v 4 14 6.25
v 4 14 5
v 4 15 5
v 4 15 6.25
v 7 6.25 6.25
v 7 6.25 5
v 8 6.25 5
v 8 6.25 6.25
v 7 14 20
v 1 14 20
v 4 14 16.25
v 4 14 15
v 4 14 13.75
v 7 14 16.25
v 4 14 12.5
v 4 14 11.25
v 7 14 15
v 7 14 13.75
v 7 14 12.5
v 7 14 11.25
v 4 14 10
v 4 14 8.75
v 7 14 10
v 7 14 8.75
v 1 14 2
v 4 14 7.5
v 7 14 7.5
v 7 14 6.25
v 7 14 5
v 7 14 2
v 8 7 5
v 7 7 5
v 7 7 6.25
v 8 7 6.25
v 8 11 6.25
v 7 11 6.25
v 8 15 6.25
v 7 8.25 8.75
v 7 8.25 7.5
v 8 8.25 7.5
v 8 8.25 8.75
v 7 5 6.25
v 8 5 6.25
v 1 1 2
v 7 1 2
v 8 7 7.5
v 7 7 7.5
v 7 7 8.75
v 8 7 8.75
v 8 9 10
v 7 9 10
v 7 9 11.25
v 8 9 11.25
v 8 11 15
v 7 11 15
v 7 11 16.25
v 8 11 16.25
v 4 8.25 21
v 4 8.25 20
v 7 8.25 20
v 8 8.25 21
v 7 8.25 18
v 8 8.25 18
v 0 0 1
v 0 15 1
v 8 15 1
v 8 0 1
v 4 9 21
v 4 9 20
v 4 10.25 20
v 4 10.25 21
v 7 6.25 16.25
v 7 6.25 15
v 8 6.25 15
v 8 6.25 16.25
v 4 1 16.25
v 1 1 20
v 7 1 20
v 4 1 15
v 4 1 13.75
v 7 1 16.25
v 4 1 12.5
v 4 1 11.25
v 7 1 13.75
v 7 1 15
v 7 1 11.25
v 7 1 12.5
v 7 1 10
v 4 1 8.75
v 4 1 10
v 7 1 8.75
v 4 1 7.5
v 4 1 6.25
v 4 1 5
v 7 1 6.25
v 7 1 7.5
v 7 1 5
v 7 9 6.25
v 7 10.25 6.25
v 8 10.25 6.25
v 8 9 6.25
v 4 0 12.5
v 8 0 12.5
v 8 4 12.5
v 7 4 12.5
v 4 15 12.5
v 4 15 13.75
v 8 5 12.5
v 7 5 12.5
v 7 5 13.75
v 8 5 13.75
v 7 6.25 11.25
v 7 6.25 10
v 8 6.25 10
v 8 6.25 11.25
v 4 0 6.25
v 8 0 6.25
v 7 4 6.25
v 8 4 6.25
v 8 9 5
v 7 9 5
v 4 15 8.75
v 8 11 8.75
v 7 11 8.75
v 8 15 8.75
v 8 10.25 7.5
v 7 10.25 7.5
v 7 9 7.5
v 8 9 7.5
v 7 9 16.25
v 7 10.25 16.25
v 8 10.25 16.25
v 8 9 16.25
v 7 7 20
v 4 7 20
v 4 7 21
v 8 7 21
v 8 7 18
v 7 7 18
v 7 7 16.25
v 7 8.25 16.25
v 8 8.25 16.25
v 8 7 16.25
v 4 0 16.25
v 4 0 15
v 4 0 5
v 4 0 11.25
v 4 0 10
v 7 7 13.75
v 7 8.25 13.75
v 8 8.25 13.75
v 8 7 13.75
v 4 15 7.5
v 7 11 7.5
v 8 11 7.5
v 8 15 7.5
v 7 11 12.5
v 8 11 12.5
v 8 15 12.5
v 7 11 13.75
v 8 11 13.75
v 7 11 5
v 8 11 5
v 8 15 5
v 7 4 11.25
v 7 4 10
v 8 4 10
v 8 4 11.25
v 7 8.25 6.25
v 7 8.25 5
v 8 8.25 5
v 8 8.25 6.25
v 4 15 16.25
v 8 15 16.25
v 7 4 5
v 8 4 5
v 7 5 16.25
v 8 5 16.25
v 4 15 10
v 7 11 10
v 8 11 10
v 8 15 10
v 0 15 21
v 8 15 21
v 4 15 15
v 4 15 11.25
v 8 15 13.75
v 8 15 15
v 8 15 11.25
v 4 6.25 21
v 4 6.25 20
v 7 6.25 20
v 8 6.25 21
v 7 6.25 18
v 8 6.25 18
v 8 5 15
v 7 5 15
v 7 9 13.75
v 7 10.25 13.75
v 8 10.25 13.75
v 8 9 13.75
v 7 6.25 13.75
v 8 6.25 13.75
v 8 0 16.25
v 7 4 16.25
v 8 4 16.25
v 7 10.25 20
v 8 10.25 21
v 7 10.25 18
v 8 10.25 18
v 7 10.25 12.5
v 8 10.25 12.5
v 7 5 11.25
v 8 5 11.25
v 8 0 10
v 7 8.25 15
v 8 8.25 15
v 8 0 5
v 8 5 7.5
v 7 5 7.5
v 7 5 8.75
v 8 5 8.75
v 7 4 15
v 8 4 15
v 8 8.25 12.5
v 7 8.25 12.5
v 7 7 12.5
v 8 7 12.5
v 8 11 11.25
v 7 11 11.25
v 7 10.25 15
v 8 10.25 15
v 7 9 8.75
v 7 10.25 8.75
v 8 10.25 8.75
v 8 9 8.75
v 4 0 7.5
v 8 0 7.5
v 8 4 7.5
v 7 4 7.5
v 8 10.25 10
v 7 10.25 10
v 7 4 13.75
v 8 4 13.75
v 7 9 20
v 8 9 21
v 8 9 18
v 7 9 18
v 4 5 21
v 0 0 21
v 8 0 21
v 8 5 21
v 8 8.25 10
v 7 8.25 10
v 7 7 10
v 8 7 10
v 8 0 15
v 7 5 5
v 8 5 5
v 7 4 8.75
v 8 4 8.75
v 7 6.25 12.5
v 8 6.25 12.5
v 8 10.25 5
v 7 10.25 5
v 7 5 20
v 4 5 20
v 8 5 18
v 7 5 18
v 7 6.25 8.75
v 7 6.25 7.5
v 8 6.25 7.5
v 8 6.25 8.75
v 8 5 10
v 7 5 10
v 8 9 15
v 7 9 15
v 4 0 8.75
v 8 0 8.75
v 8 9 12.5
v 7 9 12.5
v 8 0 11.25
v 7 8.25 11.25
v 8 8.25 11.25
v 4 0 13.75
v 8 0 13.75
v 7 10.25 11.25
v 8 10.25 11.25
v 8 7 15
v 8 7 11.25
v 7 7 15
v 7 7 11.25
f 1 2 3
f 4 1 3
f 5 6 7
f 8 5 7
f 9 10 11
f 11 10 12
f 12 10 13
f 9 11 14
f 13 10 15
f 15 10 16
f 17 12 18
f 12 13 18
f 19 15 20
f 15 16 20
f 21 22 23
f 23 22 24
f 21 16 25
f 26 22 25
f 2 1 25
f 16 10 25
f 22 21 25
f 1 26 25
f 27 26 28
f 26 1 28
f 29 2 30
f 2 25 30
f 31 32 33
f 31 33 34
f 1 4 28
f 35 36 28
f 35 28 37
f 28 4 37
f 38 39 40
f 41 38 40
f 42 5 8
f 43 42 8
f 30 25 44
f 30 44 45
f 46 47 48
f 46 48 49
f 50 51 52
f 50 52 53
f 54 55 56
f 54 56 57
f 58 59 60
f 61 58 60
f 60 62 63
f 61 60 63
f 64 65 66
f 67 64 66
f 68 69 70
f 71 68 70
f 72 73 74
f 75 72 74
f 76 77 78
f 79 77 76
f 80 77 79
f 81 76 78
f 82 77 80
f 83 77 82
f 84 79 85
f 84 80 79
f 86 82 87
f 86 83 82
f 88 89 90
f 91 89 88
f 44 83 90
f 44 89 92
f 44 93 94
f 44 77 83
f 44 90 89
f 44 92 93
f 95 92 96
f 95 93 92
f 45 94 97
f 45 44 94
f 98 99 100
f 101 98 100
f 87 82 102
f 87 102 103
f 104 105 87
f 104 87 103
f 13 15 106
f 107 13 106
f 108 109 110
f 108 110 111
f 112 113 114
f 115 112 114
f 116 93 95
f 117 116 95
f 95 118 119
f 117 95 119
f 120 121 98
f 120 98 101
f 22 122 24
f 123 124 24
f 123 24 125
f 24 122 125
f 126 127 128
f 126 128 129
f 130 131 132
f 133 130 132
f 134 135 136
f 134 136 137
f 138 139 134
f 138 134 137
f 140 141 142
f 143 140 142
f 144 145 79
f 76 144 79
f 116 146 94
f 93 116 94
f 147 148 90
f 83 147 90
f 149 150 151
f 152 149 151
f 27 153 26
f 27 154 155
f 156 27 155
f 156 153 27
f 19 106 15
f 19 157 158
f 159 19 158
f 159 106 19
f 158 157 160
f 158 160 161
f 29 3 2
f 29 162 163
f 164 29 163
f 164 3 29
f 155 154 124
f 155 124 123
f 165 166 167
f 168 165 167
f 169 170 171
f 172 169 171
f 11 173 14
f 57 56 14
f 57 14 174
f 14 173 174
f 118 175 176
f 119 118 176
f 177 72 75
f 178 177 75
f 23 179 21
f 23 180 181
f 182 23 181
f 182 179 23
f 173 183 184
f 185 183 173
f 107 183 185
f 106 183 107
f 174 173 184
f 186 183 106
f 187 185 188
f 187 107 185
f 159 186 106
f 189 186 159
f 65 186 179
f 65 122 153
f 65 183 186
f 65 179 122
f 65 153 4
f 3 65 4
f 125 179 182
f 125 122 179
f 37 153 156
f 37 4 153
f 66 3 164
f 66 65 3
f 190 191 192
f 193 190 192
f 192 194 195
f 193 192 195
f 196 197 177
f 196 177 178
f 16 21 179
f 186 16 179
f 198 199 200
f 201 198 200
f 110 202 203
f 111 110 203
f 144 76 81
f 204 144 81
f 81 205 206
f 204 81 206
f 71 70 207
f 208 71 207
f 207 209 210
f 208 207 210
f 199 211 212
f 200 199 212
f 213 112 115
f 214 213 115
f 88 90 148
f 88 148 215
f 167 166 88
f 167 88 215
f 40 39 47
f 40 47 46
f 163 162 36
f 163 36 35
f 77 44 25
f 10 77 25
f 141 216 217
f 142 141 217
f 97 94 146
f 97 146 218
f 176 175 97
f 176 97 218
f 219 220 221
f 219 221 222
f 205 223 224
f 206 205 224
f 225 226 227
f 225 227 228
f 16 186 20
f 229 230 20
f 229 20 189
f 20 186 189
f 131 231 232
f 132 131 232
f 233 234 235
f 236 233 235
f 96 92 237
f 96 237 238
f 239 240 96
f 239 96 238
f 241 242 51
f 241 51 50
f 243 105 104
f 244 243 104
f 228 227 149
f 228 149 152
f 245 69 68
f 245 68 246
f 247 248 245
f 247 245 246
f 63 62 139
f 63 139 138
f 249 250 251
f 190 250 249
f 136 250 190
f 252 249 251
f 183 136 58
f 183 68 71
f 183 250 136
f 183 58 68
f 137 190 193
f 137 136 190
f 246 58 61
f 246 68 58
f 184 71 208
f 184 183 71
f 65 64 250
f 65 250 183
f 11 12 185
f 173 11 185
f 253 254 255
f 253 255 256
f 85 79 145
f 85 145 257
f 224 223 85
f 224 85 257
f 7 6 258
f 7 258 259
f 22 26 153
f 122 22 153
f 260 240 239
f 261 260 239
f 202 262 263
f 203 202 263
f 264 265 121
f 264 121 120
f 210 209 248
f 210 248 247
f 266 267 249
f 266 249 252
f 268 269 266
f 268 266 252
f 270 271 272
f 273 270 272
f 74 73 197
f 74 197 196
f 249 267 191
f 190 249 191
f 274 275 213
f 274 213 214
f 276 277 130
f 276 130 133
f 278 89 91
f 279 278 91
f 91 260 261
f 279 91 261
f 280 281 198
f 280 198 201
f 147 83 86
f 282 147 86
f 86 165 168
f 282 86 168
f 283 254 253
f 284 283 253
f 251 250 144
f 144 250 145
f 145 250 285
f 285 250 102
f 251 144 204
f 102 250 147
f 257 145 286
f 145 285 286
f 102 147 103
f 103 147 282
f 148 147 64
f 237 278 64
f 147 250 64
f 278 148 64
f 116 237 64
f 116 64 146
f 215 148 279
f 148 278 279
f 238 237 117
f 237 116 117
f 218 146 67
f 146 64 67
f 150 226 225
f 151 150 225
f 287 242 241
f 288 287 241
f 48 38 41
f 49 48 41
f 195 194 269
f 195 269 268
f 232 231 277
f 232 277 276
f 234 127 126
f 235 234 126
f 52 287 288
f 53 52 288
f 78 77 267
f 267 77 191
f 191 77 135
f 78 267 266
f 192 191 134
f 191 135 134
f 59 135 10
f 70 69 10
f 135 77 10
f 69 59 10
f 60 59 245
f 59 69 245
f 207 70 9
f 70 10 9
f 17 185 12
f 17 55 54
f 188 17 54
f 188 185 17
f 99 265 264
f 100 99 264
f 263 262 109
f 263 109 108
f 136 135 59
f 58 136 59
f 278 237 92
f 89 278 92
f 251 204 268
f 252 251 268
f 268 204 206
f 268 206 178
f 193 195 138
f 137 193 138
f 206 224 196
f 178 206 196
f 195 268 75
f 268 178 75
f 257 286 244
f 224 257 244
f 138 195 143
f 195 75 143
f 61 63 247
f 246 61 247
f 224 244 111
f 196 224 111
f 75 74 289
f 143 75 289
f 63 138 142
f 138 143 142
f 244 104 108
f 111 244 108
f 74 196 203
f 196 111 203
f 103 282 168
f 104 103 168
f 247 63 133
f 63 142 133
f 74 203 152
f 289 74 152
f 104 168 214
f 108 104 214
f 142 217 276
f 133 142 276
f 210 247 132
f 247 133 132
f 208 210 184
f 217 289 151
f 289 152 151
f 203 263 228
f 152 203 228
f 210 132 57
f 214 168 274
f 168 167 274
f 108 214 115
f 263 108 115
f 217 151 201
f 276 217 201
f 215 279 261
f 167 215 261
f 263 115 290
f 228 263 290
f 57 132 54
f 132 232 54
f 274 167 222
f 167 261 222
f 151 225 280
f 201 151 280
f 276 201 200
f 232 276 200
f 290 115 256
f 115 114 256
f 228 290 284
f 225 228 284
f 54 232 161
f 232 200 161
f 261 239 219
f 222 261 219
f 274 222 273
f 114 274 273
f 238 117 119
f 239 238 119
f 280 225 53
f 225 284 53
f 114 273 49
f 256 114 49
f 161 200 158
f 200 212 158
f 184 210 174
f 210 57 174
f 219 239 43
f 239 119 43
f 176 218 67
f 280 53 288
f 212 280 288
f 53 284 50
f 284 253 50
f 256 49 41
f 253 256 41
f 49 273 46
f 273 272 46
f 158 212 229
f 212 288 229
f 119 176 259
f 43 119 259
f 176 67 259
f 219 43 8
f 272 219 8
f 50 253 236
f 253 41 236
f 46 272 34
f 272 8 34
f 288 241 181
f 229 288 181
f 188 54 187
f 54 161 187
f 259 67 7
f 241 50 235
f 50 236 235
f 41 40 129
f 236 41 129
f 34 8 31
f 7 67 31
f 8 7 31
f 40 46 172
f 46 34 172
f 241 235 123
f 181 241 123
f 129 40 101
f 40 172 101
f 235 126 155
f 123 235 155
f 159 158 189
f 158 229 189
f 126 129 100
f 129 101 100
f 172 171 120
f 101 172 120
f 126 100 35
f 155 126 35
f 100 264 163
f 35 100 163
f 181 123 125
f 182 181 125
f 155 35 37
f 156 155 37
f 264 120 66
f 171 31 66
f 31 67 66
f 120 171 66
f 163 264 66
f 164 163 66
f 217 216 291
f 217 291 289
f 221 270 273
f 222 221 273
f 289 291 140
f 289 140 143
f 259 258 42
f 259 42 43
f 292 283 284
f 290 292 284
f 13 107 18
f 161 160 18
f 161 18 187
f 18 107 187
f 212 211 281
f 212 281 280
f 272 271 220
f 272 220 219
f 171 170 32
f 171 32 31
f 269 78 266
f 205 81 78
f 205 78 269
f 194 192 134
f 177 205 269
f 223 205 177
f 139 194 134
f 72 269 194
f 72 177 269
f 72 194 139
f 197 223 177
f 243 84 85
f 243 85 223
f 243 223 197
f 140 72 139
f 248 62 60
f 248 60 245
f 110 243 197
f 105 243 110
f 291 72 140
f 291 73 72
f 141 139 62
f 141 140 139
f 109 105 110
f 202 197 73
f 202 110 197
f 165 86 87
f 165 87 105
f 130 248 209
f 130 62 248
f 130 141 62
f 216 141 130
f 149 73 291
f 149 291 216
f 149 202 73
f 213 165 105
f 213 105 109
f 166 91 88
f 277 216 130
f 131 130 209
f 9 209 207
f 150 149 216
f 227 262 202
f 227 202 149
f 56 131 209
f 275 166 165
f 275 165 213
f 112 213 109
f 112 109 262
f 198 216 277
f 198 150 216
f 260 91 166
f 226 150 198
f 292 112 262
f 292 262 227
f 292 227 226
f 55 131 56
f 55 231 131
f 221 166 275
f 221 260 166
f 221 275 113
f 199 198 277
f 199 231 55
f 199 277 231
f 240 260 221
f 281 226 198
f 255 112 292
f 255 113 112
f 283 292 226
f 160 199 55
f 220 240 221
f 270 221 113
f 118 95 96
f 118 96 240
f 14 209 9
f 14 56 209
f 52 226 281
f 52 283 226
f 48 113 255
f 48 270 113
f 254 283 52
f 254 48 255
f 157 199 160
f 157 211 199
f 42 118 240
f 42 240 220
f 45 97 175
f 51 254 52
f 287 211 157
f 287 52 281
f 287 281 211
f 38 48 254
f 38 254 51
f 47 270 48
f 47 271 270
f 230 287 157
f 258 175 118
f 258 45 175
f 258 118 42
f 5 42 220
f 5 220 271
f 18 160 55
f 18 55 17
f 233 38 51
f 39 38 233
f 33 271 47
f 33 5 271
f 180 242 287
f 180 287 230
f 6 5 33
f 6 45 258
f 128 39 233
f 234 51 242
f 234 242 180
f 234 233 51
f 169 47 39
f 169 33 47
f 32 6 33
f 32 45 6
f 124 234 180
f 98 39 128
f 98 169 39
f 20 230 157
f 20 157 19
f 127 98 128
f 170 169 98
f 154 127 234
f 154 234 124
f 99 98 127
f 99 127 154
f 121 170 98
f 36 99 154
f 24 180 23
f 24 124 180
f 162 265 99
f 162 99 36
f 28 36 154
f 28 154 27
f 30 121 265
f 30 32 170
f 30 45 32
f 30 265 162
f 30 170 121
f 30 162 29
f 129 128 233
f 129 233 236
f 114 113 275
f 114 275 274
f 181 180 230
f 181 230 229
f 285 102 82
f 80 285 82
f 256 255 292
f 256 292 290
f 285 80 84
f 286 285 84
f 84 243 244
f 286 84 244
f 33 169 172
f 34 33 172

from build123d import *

# Parameters (mm, degrees)
BOX029_W     = 6
BOX029_H     = 13
BOX029_DEPTH = 18
BOX027_W     = 4
BOX027_H     = 1.25
BOX027_DEPTH = 3
BOX026_W     = 4
BOX026_H     = 1.25
BOX026_DEPTH = 3
BOX028_W     = 4
BOX028_H     = 1.25
BOX028_DEPTH = 3
BOX025_W     = 4
BOX025_H     = 4
BOX025_DEPTH = 1.25
BOX024_W     = 4
BOX024_H     = 4
BOX024_DEPTH = 1.25
BOX023_W     = 4
BOX023_H     = 4
BOX023_DEPTH = 1.25
BOX022_W     = 4
BOX022_H     = 4
BOX022_DEPTH = 1.25
BOX021_W     = 4
BOX021_H     = 4
BOX021_DEPTH = 1.25
BOX020_W     = 4
BOX020_H     = 4
BOX020_DEPTH = 1.25
BOX019_W     = 4
BOX019_H     = 4
BOX019_DEPTH = 1.25
BOX018_W     = 4
BOX018_H     = 4
BOX018_DEPTH = 1.25
BOX017_W     = 4
BOX017_H     = 4
BOX017_DEPTH = 1.25
BOX016_W     = 4
BOX016_H     = 4
BOX016_DEPTH = 1.25
BOX015_W     = 7
BOX015_H     = 1.25
BOX015_DEPTH = 1.25
BOX014_W     = 7
BOX014_H     = 1.25
BOX014_DEPTH = 1.25
BOX013_W     = 7
BOX013_H     = 1.25
BOX013_DEPTH = 1.25
BOX012_W     = 7
BOX012_H     = 1.25
BOX012_DEPTH = 1.25
BOX011_W     = 7
BOX011_H     = 1.25
BOX011_DEPTH = 1.25
BOX010_W     = 7
BOX010_H     = 1.25
BOX010_DEPTH = 1.25
BOX009_W     = 7
BOX009_H     = 1.25
BOX009_DEPTH = 1.25
BOX008_W     = 7
BOX008_H     = 1.25
BOX008_DEPTH = 1.25
BOX007_W     = 7
BOX007_H     = 1.25
BOX007_DEPTH = 1.25
BOX006_W     = 7
BOX006_H     = 1.25
BOX006_DEPTH = 1.25
BOX005_W     = 7
BOX005_H     = 1.25
BOX005_DEPTH = 1.25
BOX004_W     = 7
BOX004_H     = 1.25
BOX004_DEPTH = 1.25
BOX003_W     = 7
BOX003_H     = 1.25
BOX003_DEPTH = 1.25
BOX002_W     = 7
BOX002_H     = 1.25
BOX002_DEPTH = 1.25
BOX001_W     = 7
BOX001_H     = 1.25
BOX001_DEPTH = 1.25
BOX_W        = 8
BOX_H        = 15
BOX_DEPTH    = 20


with BuildPart() as middle:
    # Box029 → Box029 (new body)
    with BuildSketch(Plane(origin=(1, 1, 2), x_dir=(1, 0, 0), z_dir=(0, 0, 1))):
        with Locations((3, 6.5)):
            Rectangle(BOX029_W, BOX029_H)
    extrude(amount=BOX029_DEPTH)


with BuildPart() as cube027:
    # Box027 → Box027 (new body)
    with BuildSketch(Plane(origin=(4, 7, 18), x_dir=(1, 0, 0), z_dir=(0, 0, 1))):
        with Locations((2, 0.625)):
            Rectangle(BOX027_W, BOX027_H)
    extrude(amount=BOX027_DEPTH)


with BuildPart() as cube026:
    # Box026 → Box026 (new body)
    with BuildSketch(Plane(origin=(4, 9, 18), x_dir=(1, 0, 0), z_dir=(0, 0, 1))):
        with Locations((2, 0.625)):
            Rectangle(BOX026_W, BOX026_H)
    extrude(amount=BOX026_DEPTH)


with BuildPart() as cube028:
    # Box028 → Box028 (new body)
    with BuildSketch(Plane(origin=(4, 5, 18), x_dir=(1, 0, 0), z_dir=(0, 0, 1))):
        with Locations((2, 0.625)):
            Rectangle(BOX028_W, BOX028_H)
    extrude(amount=BOX028_DEPTH)


with BuildPart() as cube025:
    # Box025 → Box025 (new body)
    with BuildSketch(Plane(origin=(4, 11, 5), x_dir=(1, 0, 0), z_dir=(0, 0, 1))):
        with Locations((2, 2)):
            Rectangle(BOX025_W, BOX025_H)
    extrude(amount=BOX025_DEPTH)


with BuildPart() as cube024:
    # Box024 → Box024 (new body)
    with BuildSketch(Plane(origin=(4, 11, 7.5), x_dir=(1, 0, 0), z_dir=(0, 0, 1))):
        with Locations((2, 2)):
            Rectangle(BOX024_W, BOX024_H)
    extrude(amount=BOX024_DEPTH)


with BuildPart() as cube023:
    # Box023 → Box023 (new body)
    with BuildSketch(Plane(origin=(4, 11, 10), x_dir=(1, 0, 0), z_dir=(0, 0, 1))):
        with Locations((2, 2)):
            Rectangle(BOX023_W, BOX023_H)
    extrude(amount=BOX023_DEPTH)


with BuildPart() as cube022:
    # Box022 → Box022 (new body)
    with BuildSketch(Plane(origin=(4, 11, 12.5), x_dir=(1, 0, 0), z_dir=(0, 0, 1))):
        with Locations((2, 2)):
            Rectangle(BOX022_W, BOX022_H)
    extrude(amount=BOX022_DEPTH)


with BuildPart() as cube021:
    # Box021 → Box021 (new body)
    with BuildSketch(Plane(origin=(4, 11, 15), x_dir=(1, 0, 0), z_dir=(0, 0, 1))):
        with Locations((2, 2)):
            Rectangle(BOX021_W, BOX021_H)
    extrude(amount=BOX021_DEPTH)


with BuildPart() as cube020:
    # Box020 → Box020 (new body)
    with BuildSketch(Plane(origin=(4, 0, 15), x_dir=(1, 0, 0), z_dir=(0, 0, 1))):
        with Locations((2, 2)):
            Rectangle(BOX020_W, BOX020_H)
    extrude(amount=BOX020_DEPTH)


with BuildPart() as cube019:
    # Box019 → Box019 (new body)
    with BuildSketch(Plane(origin=(4, 0, 12.5), x_dir=(1, 0, 0), z_dir=(0, 0, 1))):
        with Locations((2, 2)):
            Rectangle(BOX019_W, BOX019_H)
    extrude(amount=BOX019_DEPTH)


with BuildPart() as cube018:
    # Box018 → Box018 (new body)
    with BuildSketch(Plane(origin=(4, 0, 10), x_dir=(1, 0, 0), z_dir=(0, 0, 1))):
        with Locations((2, 2)):
            Rectangle(BOX018_W, BOX018_H)
    extrude(amount=BOX018_DEPTH)


with BuildPart() as cube017:
    # Box017 → Box017 (new body)
    with BuildSketch(Plane(origin=(4, 0, 7.5), x_dir=(1, 0, 0), z_dir=(0, 0, 1))):
        with Locations((2, 2)):
            Rectangle(BOX017_W, BOX017_H)
    extrude(amount=BOX017_DEPTH)


with BuildPart() as cube016:
    # Box016 → Box016 (new body)
    with BuildSketch(Plane(origin=(4, 0, 5), x_dir=(1, 0, 0), z_dir=(0, 0, 1))):
        with Locations((2, 2)):
            Rectangle(BOX016_W, BOX016_H)
    extrude(amount=BOX016_DEPTH)


with BuildPart() as cube015:
    # Box015 → Box015 (new body)
    with BuildSketch(Plane(origin=(1, 9, 5), x_dir=(1, 0, 0), z_dir=(0, 0, 1))):
        with Locations((3.5, 0.625)):
            Rectangle(BOX015_W, BOX015_H)
    extrude(amount=BOX015_DEPTH)


with BuildPart() as cube014:
    # Box014 → Box014 (new body)
    with BuildSketch(Plane(origin=(1, 7, 5), x_dir=(1, 0, 0), z_dir=(0, 0, 1))):
        with Locations((3.5, 0.625)):
            Rectangle(BOX014_W, BOX014_H)
    extrude(amount=BOX014_DEPTH)


with BuildPart() as cube013:
    # Box013 → Box013 (new body)
    with BuildSketch(Plane(origin=(1, 5, 5), x_dir=(1, 0, 0), z_dir=(0, 0, 1))):
        with Locations((3.5, 0.625)):
            Rectangle(BOX013_W, BOX013_H)
    extrude(amount=BOX013_DEPTH)


with BuildPart() as cube012:
    # Box012 → Box012 (new body)
    with BuildSketch(Plane(origin=(1, 5, 7.5), x_dir=(1, 0, 0), z_dir=(0, 0, 1))):
        with Locations((3.5, 0.625)):
            Rectangle(BOX012_W, BOX012_H)
    extrude(amount=BOX012_DEPTH)


with BuildPart() as cube011:
    # Box011 → Box011 (new body)
    with BuildSketch(Plane(origin=(1, 7, 7.5), x_dir=(1, 0, 0), z_dir=(0, 0, 1))):
        with Locations((3.5, 0.625)):
            Rectangle(BOX011_W, BOX011_H)
    extrude(amount=BOX011_DEPTH)


with BuildPart() as cube010:
    # Box010 → Box010 (new body)
    with BuildSketch(Plane(origin=(1, 7, 10), x_dir=(1, 0, 0), z_dir=(0, 0, 1))):
        with Locations((3.5, 0.625)):
            Rectangle(BOX010_W, BOX010_H)
    extrude(amount=BOX010_DEPTH)


with BuildPart() as cube009:
    # Box009 → Box009 (new body)
    with BuildSketch(Plane(origin=(1, 9, 7.5), x_dir=(1, 0, 0), z_dir=(0, 0, 1))):
        with Locations((3.5, 0.625)):
            Rectangle(BOX009_W, BOX009_H)
    extrude(amount=BOX009_DEPTH)


with BuildPart() as cube008:
    # Box008 → Box008 (new body)
    with BuildSketch(Plane(origin=(1, 9, 10), x_dir=(1, 0, 0), z_dir=(0, 0, 1))):
        with Locations((3.5, 0.625)):
            Rectangle(BOX008_W, BOX008_H)
    extrude(amount=BOX008_DEPTH)


with BuildPart() as cube007:
    # Box007 → Box007 (new body)
    with BuildSketch(Plane(origin=(1, 5, 10), x_dir=(1, 0, 0), z_dir=(0, 0, 1))):
        with Locations((3.5, 0.625)):
            Rectangle(BOX007_W, BOX007_H)
    extrude(amount=BOX007_DEPTH)


with BuildPart() as cube006:
    # Box006 → Box006 (new body)
    with BuildSketch(Plane(origin=(1, 5, 12.5), x_dir=(1, 0, 0), z_dir=(0, 0, 1))):
        with Locations((3.5, 0.625)):
            Rectangle(BOX006_W, BOX006_H)
    extrude(amount=BOX006_DEPTH)


with BuildPart() as cube005:
    # Box005 → Box005 (new body)
    with BuildSketch(Plane(origin=(1, 9, 12.5), x_dir=(1, 0, 0), z_dir=(0, 0, 1))):
        with Locations((3.5, 0.625)):
            Rectangle(BOX005_W, BOX005_H)
    extrude(amount=BOX005_DEPTH)


with BuildPart() as cube004:
    # Box004 → Box004 (new body)
    with BuildSketch(Plane(origin=(1, 7, 12.5), x_dir=(1, 0, 0), z_dir=(0, 0, 1))):
        with Locations((3.5, 0.625)):
            Rectangle(BOX004_W, BOX004_H)
    extrude(amount=BOX004_DEPTH)


with BuildPart() as cube003:
    # Box003 → Box003 (new body)
    with BuildSketch(Plane(origin=(1, 9, 15), x_dir=(1, 0, 0), z_dir=(0, 0, 1))):
        with Locations((3.5, 0.625)):
            Rectangle(BOX003_W, BOX003_H)
    extrude(amount=BOX003_DEPTH)


with BuildPart() as cube002:
    # Box002 → Box002 (new body)
    with BuildSketch(Plane(origin=(1, 7, 15), x_dir=(1, 0, 0), z_dir=(0, 0, 1))):
        with Locations((3.5, 0.625)):
            Rectangle(BOX002_W, BOX002_H)
    extrude(amount=BOX002_DEPTH)


with BuildPart() as cube001:
    # Box001 → Box001 (new body)
    with BuildSketch(Plane(origin=(1, 5, 15), x_dir=(1, 0, 0), z_dir=(0, 0, 1))):
        with Locations((3.5, 0.625)):
            Rectangle(BOX001_W, BOX001_H)
    extrude(amount=BOX001_DEPTH)


with BuildPart() as cut045:
    # Box → Box (new body)
    with BuildSketch(Plane.XY.offset(1)):
        with Locations((4, 7.5)):
            Rectangle(BOX_W, BOX_H)
    extrude(amount=BOX_DEPTH)

    # Cut: cut Cube001
    add(cube001.part, mode=Mode.SUBTRACT)

    # Cut001: cut Cube002
    add(cube002.part, mode=Mode.SUBTRACT)

    # Cut002: cut Cube003
    add(cube003.part, mode=Mode.SUBTRACT)

    # Cut003: cut Cube004
    add(cube004.part, mode=Mode.SUBTRACT)

    # Cut004: cut Cube005
    add(cube005.part, mode=Mode.SUBTRACT)

    # Cut005: cut Cube006
    add(cube006.part, mode=Mode.SUBTRACT)

    # Cut006: cut Cube007
    add(cube007.part, mode=Mode.SUBTRACT)

    # Cut007: cut Cube008
    add(cube008.part, mode=Mode.SUBTRACT)

    # Cut008: cut Cube009
    add(cube009.part, mode=Mode.SUBTRACT)

    # Cut009: cut Cube010
    add(cube010.part, mode=Mode.SUBTRACT)

    # Cut010: cut Cube011
    add(cube011.part, mode=Mode.SUBTRACT)

    # Cut011: cut Cube012
    add(cube012.part, mode=Mode.SUBTRACT)

    # Cut012: cut Cube013
    add(cube013.part, mode=Mode.SUBTRACT)

    # Cut013: cut Cube014
    add(cube014.part, mode=Mode.SUBTRACT)

    # Cut014: cut Cube015
    add(cube015.part, mode=Mode.SUBTRACT)

    # Cut032: cut Cube016
    add(cube016.part, mode=Mode.SUBTRACT)

    # Cut033: cut Cube017
    add(cube017.part, mode=Mode.SUBTRACT)

    # Cut034: cut Cube018
    add(cube018.part, mode=Mode.SUBTRACT)

    # Cut035: cut Cube019
    add(cube019.part, mode=Mode.SUBTRACT)

    # Cut036: cut Cube020
    add(cube020.part, mode=Mode.SUBTRACT)

    # Cut037: cut Cube021
    add(cube021.part, mode=Mode.SUBTRACT)

    # Cut038: cut Cube022
    add(cube022.part, mode=Mode.SUBTRACT)

    # Cut039: cut Cube023
    add(cube023.part, mode=Mode.SUBTRACT)

    # Cut040: cut Cube024
    add(cube024.part, mode=Mode.SUBTRACT)

    # Cut041: cut Cube025
    add(cube025.part, mode=Mode.SUBTRACT)

    # Cut042: cut Cube028
    add(cube028.part, mode=Mode.SUBTRACT)

    # Cut043: cut Cube026
    add(cube026.part, mode=Mode.SUBTRACT)

    # Cut044: cut Cube027
    add(cube027.part, mode=Mode.SUBTRACT)

    # Cut045: cut Middle
    add(middle.part, mode=Mode.SUBTRACT)


solid = cut045.part
